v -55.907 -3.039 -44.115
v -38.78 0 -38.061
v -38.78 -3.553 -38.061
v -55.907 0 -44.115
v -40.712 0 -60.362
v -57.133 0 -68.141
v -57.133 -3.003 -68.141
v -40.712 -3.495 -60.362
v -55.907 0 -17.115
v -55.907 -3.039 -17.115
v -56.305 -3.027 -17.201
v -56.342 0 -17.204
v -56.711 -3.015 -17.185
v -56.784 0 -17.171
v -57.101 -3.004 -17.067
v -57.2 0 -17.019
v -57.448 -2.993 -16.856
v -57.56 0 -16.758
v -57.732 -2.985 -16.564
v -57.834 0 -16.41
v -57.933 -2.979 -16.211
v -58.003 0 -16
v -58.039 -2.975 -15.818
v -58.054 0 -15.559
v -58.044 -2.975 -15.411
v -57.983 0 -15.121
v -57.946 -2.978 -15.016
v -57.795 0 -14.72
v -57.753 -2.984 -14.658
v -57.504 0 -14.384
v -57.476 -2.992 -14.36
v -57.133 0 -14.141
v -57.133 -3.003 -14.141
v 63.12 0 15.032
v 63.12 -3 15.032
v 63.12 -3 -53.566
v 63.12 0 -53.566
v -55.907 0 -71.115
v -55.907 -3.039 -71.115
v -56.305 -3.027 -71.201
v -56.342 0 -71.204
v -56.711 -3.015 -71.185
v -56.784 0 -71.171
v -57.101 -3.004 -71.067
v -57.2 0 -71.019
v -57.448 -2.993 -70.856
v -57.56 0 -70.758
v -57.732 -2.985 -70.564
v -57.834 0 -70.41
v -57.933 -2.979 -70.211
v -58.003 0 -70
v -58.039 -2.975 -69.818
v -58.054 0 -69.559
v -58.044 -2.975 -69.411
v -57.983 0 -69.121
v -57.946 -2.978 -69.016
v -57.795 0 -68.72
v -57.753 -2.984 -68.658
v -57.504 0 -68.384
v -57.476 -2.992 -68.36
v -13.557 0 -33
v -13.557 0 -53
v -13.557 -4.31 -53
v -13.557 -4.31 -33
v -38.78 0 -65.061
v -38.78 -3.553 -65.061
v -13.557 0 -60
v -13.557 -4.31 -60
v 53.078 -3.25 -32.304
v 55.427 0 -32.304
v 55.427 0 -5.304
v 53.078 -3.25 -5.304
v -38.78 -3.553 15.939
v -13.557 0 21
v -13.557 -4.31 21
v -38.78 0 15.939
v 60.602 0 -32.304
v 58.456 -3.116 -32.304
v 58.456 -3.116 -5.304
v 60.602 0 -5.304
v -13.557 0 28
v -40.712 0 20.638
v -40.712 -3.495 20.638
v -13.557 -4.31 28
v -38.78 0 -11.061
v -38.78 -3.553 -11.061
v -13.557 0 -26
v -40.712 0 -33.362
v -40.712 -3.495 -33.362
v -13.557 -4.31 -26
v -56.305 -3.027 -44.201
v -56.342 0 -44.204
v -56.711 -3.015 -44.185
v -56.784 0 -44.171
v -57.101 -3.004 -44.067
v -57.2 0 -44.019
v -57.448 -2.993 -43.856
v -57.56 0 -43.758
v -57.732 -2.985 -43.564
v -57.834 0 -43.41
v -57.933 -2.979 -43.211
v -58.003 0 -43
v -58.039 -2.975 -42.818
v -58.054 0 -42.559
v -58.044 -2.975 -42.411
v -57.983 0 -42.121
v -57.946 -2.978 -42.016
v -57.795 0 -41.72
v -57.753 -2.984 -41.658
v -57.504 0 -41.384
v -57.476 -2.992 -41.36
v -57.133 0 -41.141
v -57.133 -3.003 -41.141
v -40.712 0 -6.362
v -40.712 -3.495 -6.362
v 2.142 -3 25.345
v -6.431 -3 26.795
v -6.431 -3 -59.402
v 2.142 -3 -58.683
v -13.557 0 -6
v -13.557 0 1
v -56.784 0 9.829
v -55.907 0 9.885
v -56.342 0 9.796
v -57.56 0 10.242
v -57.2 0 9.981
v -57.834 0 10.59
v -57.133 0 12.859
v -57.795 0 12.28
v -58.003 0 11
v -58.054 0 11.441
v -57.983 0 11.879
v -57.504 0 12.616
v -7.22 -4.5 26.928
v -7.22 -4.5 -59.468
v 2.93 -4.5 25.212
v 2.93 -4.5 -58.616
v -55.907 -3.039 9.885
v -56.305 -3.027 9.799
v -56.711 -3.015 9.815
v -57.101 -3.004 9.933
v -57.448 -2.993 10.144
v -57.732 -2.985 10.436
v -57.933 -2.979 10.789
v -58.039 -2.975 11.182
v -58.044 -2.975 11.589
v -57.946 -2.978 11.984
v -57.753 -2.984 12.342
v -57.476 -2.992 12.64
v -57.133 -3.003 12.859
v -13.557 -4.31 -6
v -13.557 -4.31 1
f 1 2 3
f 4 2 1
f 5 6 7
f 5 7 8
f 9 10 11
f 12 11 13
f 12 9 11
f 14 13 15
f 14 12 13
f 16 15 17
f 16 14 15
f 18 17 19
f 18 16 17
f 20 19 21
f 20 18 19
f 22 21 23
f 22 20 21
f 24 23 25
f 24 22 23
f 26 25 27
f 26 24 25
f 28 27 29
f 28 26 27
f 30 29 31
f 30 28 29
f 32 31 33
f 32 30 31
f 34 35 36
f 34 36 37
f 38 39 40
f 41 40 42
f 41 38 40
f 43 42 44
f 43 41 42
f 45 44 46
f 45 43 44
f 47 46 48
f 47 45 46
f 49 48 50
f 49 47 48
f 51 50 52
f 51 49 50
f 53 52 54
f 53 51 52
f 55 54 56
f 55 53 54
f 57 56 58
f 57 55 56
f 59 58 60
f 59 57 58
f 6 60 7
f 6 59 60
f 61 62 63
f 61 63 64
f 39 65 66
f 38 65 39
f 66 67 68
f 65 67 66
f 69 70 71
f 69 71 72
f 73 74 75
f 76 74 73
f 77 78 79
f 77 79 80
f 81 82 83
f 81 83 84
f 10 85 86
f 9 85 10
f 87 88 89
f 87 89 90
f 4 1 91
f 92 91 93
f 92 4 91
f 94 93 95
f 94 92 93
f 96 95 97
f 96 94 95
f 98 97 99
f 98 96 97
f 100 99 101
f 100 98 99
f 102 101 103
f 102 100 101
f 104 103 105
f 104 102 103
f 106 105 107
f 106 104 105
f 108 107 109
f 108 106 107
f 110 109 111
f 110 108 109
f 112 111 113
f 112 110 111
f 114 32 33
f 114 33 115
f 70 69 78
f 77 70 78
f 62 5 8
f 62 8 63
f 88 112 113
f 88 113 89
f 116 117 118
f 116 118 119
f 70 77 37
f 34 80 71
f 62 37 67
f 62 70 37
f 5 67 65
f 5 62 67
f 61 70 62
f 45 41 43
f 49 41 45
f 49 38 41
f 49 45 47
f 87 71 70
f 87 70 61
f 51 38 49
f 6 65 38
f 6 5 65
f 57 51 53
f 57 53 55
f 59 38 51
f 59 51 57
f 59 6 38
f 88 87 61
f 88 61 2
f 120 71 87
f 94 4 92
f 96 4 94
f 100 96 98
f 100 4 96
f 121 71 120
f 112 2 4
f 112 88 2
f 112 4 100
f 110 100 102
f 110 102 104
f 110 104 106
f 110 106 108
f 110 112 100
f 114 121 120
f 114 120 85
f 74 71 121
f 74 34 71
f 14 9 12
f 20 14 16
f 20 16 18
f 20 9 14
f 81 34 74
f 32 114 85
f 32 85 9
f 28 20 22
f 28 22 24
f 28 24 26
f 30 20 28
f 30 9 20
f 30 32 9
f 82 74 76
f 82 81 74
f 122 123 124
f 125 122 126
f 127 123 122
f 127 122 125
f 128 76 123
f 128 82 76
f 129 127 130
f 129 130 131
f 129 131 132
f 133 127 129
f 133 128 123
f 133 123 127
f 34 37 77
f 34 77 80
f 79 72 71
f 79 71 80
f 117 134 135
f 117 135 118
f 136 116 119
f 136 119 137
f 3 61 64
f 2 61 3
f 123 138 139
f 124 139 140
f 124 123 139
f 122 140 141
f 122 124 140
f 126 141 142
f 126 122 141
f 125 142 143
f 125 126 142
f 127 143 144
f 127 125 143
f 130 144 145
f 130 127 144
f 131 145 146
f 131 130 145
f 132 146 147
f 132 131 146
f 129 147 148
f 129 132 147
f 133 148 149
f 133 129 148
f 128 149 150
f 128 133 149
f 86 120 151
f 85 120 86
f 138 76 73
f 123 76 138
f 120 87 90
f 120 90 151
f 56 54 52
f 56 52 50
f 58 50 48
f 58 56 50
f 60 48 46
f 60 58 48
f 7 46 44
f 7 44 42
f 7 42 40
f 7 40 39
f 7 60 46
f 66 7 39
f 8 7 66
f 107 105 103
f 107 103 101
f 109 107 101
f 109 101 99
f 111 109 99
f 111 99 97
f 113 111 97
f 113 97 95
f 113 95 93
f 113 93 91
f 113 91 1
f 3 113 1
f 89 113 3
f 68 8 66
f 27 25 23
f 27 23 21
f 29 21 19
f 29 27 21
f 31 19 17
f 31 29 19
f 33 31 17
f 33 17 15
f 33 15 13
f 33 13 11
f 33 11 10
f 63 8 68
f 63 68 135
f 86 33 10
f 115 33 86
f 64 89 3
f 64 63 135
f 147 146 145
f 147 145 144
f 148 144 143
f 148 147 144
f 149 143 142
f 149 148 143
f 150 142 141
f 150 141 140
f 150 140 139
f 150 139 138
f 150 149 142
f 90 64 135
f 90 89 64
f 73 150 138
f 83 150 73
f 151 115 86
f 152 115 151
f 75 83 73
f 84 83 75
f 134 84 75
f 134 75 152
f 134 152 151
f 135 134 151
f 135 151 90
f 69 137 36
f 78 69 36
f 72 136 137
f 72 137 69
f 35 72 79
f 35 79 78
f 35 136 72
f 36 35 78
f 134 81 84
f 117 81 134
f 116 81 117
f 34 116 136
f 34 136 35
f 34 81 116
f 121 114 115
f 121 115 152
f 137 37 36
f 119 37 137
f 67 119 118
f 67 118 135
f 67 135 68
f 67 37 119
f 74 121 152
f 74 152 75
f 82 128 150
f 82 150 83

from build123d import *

# Parameters (mm, degrees)
BOSS_EXTRUDE1_START = 28
BOSS_EXTRUDE1_DEPTH = 99.579374
SKETCH1_OUTSIDE_W   = 155.246
SKETCH1_OUTSIDE_H   = 133.053
CUT_EXTRUDE1_DEPTH  = 96.54042058
CUT_EXTRUDE2_START  = -32.303625
CUT_EXTRUDE2_DEPTH  = 27


with BuildPart() as part:
    # Sketch2 → Boss-Extrude1 (new body)
    with BuildSketch(Plane.XY.offset(BOSS_EXTRUDE1_START)):
        Polygon((-58.652152565, -2.957030561), (-7.219837935, -4.5), (-6.431436891, -3), (2.141659611, -3), (2.930060654, -4.5), (63.119847768, -3), (63.119847768, 0), (-58.652152565, 0), align=None)
    extrude(amount=-BOSS_EXTRUDE1_DEPTH)

    # Sketch1 outside → Cut-Extrude1 (cut, through all)
    with BuildSketch(Plane(origin=(0, 0, 0), x_dir=(1, 0, 0), z_dir=(0, 1, 0))):
        with Locations((2.234, 21.7895)):
            Rectangle(SKETCH1_OUTSIDE_W, SKETCH1_OUTSIDE_H)
        with BuildLine():
            Line((-40.711846446, -20.63757447), (-13.556580584, -28))
            Line((-13.556580584, -28), (63.119847768, -15.031886942))
            Line((63.119847768, -15.031886942), (63.119847768, 53.565574166))
            Line((63.119847768, 53.565574166), (-13.556580584, 60))
            Line((-13.556580584, 60), (-38.779919931, 65.060888634))
            Line((-38.779919931, 65.060888634), (-55.906958074, 71.115272488))
            ThreePointArc((-55.906958074, 71.115272488), (-57.932881972, 70.210638871), (-57.133307602, 68.140998698))
            Line((-57.133307602, 68.140998698), (-40.711846446, 60.36242553))
            Line((-40.711846446, 60.36242553), (-13.556580584, 53))
            Line((-13.556580584, 53), (-13.556580584, 33))
            Line((-13.556580584, 33), (-38.779919931, 38.060888634))
            Line((-38.779919931, 38.060888634), (-55.906958074, 44.115272488))
            ThreePointArc((-55.906958074, 44.115272488), (-57.932881972, 43.210638871), (-57.133307602, 41.140998698))
            Line((-57.133307602, 41.140998698), (-40.711846446, 33.36242553))
            Line((-40.711846446, 33.36242553), (-13.556580584, 26))
            Line((-13.556580584, 26), (-13.556580584, 6))
            Line((-13.556580584, 6), (-38.779919931, 11.060888634))
            Line((-38.779919931, 11.060888634), (-55.906958074, 17.115272488))
            ThreePointArc((-55.906958074, 17.115272488), (-57.932881972, 16.210638871), (-57.133307602, 14.140998698))
            Line((-57.133307602, 14.140998698), (-40.711846446, 6.36242553))
            Line((-40.711846446, 6.36242553), (-13.556580584, -1))
            Line((-13.556580584, -1), (-13.556580584, -21))
            Line((-13.556580584, -21), (-38.779919931, -15.939111366))
            Line((-38.779919931, -15.939111366), (-55.906958074, -9.884727512))
            ThreePointArc((-55.906958074, -9.884727512), (-57.932881972, -10.789361129), (-57.133307602, -12.859001302))
            Line((-57.133307602, -12.859001302), (-40.711846446, -20.63757447))
        make_face(mode=Mode.SUBTRACT)
    extrude(amount=-CUT_EXTRUDE1_DEPTH, mode=Mode.SUBTRACT)

    # Sketch3 → Cut-Extrude2 (cut)
    with BuildSketch(Plane.XY.offset(CUT_EXTRUDE2_START)):
        Polygon((60.602138865, 0), (55.427246155, 0), (53.07800672, -3.250254442), (58.455951346, -3.116229762), align=None)
    extrude(amount=CUT_EXTRUDE2_DEPTH, mode=Mode.SUBTRACT)


solid = part.part
